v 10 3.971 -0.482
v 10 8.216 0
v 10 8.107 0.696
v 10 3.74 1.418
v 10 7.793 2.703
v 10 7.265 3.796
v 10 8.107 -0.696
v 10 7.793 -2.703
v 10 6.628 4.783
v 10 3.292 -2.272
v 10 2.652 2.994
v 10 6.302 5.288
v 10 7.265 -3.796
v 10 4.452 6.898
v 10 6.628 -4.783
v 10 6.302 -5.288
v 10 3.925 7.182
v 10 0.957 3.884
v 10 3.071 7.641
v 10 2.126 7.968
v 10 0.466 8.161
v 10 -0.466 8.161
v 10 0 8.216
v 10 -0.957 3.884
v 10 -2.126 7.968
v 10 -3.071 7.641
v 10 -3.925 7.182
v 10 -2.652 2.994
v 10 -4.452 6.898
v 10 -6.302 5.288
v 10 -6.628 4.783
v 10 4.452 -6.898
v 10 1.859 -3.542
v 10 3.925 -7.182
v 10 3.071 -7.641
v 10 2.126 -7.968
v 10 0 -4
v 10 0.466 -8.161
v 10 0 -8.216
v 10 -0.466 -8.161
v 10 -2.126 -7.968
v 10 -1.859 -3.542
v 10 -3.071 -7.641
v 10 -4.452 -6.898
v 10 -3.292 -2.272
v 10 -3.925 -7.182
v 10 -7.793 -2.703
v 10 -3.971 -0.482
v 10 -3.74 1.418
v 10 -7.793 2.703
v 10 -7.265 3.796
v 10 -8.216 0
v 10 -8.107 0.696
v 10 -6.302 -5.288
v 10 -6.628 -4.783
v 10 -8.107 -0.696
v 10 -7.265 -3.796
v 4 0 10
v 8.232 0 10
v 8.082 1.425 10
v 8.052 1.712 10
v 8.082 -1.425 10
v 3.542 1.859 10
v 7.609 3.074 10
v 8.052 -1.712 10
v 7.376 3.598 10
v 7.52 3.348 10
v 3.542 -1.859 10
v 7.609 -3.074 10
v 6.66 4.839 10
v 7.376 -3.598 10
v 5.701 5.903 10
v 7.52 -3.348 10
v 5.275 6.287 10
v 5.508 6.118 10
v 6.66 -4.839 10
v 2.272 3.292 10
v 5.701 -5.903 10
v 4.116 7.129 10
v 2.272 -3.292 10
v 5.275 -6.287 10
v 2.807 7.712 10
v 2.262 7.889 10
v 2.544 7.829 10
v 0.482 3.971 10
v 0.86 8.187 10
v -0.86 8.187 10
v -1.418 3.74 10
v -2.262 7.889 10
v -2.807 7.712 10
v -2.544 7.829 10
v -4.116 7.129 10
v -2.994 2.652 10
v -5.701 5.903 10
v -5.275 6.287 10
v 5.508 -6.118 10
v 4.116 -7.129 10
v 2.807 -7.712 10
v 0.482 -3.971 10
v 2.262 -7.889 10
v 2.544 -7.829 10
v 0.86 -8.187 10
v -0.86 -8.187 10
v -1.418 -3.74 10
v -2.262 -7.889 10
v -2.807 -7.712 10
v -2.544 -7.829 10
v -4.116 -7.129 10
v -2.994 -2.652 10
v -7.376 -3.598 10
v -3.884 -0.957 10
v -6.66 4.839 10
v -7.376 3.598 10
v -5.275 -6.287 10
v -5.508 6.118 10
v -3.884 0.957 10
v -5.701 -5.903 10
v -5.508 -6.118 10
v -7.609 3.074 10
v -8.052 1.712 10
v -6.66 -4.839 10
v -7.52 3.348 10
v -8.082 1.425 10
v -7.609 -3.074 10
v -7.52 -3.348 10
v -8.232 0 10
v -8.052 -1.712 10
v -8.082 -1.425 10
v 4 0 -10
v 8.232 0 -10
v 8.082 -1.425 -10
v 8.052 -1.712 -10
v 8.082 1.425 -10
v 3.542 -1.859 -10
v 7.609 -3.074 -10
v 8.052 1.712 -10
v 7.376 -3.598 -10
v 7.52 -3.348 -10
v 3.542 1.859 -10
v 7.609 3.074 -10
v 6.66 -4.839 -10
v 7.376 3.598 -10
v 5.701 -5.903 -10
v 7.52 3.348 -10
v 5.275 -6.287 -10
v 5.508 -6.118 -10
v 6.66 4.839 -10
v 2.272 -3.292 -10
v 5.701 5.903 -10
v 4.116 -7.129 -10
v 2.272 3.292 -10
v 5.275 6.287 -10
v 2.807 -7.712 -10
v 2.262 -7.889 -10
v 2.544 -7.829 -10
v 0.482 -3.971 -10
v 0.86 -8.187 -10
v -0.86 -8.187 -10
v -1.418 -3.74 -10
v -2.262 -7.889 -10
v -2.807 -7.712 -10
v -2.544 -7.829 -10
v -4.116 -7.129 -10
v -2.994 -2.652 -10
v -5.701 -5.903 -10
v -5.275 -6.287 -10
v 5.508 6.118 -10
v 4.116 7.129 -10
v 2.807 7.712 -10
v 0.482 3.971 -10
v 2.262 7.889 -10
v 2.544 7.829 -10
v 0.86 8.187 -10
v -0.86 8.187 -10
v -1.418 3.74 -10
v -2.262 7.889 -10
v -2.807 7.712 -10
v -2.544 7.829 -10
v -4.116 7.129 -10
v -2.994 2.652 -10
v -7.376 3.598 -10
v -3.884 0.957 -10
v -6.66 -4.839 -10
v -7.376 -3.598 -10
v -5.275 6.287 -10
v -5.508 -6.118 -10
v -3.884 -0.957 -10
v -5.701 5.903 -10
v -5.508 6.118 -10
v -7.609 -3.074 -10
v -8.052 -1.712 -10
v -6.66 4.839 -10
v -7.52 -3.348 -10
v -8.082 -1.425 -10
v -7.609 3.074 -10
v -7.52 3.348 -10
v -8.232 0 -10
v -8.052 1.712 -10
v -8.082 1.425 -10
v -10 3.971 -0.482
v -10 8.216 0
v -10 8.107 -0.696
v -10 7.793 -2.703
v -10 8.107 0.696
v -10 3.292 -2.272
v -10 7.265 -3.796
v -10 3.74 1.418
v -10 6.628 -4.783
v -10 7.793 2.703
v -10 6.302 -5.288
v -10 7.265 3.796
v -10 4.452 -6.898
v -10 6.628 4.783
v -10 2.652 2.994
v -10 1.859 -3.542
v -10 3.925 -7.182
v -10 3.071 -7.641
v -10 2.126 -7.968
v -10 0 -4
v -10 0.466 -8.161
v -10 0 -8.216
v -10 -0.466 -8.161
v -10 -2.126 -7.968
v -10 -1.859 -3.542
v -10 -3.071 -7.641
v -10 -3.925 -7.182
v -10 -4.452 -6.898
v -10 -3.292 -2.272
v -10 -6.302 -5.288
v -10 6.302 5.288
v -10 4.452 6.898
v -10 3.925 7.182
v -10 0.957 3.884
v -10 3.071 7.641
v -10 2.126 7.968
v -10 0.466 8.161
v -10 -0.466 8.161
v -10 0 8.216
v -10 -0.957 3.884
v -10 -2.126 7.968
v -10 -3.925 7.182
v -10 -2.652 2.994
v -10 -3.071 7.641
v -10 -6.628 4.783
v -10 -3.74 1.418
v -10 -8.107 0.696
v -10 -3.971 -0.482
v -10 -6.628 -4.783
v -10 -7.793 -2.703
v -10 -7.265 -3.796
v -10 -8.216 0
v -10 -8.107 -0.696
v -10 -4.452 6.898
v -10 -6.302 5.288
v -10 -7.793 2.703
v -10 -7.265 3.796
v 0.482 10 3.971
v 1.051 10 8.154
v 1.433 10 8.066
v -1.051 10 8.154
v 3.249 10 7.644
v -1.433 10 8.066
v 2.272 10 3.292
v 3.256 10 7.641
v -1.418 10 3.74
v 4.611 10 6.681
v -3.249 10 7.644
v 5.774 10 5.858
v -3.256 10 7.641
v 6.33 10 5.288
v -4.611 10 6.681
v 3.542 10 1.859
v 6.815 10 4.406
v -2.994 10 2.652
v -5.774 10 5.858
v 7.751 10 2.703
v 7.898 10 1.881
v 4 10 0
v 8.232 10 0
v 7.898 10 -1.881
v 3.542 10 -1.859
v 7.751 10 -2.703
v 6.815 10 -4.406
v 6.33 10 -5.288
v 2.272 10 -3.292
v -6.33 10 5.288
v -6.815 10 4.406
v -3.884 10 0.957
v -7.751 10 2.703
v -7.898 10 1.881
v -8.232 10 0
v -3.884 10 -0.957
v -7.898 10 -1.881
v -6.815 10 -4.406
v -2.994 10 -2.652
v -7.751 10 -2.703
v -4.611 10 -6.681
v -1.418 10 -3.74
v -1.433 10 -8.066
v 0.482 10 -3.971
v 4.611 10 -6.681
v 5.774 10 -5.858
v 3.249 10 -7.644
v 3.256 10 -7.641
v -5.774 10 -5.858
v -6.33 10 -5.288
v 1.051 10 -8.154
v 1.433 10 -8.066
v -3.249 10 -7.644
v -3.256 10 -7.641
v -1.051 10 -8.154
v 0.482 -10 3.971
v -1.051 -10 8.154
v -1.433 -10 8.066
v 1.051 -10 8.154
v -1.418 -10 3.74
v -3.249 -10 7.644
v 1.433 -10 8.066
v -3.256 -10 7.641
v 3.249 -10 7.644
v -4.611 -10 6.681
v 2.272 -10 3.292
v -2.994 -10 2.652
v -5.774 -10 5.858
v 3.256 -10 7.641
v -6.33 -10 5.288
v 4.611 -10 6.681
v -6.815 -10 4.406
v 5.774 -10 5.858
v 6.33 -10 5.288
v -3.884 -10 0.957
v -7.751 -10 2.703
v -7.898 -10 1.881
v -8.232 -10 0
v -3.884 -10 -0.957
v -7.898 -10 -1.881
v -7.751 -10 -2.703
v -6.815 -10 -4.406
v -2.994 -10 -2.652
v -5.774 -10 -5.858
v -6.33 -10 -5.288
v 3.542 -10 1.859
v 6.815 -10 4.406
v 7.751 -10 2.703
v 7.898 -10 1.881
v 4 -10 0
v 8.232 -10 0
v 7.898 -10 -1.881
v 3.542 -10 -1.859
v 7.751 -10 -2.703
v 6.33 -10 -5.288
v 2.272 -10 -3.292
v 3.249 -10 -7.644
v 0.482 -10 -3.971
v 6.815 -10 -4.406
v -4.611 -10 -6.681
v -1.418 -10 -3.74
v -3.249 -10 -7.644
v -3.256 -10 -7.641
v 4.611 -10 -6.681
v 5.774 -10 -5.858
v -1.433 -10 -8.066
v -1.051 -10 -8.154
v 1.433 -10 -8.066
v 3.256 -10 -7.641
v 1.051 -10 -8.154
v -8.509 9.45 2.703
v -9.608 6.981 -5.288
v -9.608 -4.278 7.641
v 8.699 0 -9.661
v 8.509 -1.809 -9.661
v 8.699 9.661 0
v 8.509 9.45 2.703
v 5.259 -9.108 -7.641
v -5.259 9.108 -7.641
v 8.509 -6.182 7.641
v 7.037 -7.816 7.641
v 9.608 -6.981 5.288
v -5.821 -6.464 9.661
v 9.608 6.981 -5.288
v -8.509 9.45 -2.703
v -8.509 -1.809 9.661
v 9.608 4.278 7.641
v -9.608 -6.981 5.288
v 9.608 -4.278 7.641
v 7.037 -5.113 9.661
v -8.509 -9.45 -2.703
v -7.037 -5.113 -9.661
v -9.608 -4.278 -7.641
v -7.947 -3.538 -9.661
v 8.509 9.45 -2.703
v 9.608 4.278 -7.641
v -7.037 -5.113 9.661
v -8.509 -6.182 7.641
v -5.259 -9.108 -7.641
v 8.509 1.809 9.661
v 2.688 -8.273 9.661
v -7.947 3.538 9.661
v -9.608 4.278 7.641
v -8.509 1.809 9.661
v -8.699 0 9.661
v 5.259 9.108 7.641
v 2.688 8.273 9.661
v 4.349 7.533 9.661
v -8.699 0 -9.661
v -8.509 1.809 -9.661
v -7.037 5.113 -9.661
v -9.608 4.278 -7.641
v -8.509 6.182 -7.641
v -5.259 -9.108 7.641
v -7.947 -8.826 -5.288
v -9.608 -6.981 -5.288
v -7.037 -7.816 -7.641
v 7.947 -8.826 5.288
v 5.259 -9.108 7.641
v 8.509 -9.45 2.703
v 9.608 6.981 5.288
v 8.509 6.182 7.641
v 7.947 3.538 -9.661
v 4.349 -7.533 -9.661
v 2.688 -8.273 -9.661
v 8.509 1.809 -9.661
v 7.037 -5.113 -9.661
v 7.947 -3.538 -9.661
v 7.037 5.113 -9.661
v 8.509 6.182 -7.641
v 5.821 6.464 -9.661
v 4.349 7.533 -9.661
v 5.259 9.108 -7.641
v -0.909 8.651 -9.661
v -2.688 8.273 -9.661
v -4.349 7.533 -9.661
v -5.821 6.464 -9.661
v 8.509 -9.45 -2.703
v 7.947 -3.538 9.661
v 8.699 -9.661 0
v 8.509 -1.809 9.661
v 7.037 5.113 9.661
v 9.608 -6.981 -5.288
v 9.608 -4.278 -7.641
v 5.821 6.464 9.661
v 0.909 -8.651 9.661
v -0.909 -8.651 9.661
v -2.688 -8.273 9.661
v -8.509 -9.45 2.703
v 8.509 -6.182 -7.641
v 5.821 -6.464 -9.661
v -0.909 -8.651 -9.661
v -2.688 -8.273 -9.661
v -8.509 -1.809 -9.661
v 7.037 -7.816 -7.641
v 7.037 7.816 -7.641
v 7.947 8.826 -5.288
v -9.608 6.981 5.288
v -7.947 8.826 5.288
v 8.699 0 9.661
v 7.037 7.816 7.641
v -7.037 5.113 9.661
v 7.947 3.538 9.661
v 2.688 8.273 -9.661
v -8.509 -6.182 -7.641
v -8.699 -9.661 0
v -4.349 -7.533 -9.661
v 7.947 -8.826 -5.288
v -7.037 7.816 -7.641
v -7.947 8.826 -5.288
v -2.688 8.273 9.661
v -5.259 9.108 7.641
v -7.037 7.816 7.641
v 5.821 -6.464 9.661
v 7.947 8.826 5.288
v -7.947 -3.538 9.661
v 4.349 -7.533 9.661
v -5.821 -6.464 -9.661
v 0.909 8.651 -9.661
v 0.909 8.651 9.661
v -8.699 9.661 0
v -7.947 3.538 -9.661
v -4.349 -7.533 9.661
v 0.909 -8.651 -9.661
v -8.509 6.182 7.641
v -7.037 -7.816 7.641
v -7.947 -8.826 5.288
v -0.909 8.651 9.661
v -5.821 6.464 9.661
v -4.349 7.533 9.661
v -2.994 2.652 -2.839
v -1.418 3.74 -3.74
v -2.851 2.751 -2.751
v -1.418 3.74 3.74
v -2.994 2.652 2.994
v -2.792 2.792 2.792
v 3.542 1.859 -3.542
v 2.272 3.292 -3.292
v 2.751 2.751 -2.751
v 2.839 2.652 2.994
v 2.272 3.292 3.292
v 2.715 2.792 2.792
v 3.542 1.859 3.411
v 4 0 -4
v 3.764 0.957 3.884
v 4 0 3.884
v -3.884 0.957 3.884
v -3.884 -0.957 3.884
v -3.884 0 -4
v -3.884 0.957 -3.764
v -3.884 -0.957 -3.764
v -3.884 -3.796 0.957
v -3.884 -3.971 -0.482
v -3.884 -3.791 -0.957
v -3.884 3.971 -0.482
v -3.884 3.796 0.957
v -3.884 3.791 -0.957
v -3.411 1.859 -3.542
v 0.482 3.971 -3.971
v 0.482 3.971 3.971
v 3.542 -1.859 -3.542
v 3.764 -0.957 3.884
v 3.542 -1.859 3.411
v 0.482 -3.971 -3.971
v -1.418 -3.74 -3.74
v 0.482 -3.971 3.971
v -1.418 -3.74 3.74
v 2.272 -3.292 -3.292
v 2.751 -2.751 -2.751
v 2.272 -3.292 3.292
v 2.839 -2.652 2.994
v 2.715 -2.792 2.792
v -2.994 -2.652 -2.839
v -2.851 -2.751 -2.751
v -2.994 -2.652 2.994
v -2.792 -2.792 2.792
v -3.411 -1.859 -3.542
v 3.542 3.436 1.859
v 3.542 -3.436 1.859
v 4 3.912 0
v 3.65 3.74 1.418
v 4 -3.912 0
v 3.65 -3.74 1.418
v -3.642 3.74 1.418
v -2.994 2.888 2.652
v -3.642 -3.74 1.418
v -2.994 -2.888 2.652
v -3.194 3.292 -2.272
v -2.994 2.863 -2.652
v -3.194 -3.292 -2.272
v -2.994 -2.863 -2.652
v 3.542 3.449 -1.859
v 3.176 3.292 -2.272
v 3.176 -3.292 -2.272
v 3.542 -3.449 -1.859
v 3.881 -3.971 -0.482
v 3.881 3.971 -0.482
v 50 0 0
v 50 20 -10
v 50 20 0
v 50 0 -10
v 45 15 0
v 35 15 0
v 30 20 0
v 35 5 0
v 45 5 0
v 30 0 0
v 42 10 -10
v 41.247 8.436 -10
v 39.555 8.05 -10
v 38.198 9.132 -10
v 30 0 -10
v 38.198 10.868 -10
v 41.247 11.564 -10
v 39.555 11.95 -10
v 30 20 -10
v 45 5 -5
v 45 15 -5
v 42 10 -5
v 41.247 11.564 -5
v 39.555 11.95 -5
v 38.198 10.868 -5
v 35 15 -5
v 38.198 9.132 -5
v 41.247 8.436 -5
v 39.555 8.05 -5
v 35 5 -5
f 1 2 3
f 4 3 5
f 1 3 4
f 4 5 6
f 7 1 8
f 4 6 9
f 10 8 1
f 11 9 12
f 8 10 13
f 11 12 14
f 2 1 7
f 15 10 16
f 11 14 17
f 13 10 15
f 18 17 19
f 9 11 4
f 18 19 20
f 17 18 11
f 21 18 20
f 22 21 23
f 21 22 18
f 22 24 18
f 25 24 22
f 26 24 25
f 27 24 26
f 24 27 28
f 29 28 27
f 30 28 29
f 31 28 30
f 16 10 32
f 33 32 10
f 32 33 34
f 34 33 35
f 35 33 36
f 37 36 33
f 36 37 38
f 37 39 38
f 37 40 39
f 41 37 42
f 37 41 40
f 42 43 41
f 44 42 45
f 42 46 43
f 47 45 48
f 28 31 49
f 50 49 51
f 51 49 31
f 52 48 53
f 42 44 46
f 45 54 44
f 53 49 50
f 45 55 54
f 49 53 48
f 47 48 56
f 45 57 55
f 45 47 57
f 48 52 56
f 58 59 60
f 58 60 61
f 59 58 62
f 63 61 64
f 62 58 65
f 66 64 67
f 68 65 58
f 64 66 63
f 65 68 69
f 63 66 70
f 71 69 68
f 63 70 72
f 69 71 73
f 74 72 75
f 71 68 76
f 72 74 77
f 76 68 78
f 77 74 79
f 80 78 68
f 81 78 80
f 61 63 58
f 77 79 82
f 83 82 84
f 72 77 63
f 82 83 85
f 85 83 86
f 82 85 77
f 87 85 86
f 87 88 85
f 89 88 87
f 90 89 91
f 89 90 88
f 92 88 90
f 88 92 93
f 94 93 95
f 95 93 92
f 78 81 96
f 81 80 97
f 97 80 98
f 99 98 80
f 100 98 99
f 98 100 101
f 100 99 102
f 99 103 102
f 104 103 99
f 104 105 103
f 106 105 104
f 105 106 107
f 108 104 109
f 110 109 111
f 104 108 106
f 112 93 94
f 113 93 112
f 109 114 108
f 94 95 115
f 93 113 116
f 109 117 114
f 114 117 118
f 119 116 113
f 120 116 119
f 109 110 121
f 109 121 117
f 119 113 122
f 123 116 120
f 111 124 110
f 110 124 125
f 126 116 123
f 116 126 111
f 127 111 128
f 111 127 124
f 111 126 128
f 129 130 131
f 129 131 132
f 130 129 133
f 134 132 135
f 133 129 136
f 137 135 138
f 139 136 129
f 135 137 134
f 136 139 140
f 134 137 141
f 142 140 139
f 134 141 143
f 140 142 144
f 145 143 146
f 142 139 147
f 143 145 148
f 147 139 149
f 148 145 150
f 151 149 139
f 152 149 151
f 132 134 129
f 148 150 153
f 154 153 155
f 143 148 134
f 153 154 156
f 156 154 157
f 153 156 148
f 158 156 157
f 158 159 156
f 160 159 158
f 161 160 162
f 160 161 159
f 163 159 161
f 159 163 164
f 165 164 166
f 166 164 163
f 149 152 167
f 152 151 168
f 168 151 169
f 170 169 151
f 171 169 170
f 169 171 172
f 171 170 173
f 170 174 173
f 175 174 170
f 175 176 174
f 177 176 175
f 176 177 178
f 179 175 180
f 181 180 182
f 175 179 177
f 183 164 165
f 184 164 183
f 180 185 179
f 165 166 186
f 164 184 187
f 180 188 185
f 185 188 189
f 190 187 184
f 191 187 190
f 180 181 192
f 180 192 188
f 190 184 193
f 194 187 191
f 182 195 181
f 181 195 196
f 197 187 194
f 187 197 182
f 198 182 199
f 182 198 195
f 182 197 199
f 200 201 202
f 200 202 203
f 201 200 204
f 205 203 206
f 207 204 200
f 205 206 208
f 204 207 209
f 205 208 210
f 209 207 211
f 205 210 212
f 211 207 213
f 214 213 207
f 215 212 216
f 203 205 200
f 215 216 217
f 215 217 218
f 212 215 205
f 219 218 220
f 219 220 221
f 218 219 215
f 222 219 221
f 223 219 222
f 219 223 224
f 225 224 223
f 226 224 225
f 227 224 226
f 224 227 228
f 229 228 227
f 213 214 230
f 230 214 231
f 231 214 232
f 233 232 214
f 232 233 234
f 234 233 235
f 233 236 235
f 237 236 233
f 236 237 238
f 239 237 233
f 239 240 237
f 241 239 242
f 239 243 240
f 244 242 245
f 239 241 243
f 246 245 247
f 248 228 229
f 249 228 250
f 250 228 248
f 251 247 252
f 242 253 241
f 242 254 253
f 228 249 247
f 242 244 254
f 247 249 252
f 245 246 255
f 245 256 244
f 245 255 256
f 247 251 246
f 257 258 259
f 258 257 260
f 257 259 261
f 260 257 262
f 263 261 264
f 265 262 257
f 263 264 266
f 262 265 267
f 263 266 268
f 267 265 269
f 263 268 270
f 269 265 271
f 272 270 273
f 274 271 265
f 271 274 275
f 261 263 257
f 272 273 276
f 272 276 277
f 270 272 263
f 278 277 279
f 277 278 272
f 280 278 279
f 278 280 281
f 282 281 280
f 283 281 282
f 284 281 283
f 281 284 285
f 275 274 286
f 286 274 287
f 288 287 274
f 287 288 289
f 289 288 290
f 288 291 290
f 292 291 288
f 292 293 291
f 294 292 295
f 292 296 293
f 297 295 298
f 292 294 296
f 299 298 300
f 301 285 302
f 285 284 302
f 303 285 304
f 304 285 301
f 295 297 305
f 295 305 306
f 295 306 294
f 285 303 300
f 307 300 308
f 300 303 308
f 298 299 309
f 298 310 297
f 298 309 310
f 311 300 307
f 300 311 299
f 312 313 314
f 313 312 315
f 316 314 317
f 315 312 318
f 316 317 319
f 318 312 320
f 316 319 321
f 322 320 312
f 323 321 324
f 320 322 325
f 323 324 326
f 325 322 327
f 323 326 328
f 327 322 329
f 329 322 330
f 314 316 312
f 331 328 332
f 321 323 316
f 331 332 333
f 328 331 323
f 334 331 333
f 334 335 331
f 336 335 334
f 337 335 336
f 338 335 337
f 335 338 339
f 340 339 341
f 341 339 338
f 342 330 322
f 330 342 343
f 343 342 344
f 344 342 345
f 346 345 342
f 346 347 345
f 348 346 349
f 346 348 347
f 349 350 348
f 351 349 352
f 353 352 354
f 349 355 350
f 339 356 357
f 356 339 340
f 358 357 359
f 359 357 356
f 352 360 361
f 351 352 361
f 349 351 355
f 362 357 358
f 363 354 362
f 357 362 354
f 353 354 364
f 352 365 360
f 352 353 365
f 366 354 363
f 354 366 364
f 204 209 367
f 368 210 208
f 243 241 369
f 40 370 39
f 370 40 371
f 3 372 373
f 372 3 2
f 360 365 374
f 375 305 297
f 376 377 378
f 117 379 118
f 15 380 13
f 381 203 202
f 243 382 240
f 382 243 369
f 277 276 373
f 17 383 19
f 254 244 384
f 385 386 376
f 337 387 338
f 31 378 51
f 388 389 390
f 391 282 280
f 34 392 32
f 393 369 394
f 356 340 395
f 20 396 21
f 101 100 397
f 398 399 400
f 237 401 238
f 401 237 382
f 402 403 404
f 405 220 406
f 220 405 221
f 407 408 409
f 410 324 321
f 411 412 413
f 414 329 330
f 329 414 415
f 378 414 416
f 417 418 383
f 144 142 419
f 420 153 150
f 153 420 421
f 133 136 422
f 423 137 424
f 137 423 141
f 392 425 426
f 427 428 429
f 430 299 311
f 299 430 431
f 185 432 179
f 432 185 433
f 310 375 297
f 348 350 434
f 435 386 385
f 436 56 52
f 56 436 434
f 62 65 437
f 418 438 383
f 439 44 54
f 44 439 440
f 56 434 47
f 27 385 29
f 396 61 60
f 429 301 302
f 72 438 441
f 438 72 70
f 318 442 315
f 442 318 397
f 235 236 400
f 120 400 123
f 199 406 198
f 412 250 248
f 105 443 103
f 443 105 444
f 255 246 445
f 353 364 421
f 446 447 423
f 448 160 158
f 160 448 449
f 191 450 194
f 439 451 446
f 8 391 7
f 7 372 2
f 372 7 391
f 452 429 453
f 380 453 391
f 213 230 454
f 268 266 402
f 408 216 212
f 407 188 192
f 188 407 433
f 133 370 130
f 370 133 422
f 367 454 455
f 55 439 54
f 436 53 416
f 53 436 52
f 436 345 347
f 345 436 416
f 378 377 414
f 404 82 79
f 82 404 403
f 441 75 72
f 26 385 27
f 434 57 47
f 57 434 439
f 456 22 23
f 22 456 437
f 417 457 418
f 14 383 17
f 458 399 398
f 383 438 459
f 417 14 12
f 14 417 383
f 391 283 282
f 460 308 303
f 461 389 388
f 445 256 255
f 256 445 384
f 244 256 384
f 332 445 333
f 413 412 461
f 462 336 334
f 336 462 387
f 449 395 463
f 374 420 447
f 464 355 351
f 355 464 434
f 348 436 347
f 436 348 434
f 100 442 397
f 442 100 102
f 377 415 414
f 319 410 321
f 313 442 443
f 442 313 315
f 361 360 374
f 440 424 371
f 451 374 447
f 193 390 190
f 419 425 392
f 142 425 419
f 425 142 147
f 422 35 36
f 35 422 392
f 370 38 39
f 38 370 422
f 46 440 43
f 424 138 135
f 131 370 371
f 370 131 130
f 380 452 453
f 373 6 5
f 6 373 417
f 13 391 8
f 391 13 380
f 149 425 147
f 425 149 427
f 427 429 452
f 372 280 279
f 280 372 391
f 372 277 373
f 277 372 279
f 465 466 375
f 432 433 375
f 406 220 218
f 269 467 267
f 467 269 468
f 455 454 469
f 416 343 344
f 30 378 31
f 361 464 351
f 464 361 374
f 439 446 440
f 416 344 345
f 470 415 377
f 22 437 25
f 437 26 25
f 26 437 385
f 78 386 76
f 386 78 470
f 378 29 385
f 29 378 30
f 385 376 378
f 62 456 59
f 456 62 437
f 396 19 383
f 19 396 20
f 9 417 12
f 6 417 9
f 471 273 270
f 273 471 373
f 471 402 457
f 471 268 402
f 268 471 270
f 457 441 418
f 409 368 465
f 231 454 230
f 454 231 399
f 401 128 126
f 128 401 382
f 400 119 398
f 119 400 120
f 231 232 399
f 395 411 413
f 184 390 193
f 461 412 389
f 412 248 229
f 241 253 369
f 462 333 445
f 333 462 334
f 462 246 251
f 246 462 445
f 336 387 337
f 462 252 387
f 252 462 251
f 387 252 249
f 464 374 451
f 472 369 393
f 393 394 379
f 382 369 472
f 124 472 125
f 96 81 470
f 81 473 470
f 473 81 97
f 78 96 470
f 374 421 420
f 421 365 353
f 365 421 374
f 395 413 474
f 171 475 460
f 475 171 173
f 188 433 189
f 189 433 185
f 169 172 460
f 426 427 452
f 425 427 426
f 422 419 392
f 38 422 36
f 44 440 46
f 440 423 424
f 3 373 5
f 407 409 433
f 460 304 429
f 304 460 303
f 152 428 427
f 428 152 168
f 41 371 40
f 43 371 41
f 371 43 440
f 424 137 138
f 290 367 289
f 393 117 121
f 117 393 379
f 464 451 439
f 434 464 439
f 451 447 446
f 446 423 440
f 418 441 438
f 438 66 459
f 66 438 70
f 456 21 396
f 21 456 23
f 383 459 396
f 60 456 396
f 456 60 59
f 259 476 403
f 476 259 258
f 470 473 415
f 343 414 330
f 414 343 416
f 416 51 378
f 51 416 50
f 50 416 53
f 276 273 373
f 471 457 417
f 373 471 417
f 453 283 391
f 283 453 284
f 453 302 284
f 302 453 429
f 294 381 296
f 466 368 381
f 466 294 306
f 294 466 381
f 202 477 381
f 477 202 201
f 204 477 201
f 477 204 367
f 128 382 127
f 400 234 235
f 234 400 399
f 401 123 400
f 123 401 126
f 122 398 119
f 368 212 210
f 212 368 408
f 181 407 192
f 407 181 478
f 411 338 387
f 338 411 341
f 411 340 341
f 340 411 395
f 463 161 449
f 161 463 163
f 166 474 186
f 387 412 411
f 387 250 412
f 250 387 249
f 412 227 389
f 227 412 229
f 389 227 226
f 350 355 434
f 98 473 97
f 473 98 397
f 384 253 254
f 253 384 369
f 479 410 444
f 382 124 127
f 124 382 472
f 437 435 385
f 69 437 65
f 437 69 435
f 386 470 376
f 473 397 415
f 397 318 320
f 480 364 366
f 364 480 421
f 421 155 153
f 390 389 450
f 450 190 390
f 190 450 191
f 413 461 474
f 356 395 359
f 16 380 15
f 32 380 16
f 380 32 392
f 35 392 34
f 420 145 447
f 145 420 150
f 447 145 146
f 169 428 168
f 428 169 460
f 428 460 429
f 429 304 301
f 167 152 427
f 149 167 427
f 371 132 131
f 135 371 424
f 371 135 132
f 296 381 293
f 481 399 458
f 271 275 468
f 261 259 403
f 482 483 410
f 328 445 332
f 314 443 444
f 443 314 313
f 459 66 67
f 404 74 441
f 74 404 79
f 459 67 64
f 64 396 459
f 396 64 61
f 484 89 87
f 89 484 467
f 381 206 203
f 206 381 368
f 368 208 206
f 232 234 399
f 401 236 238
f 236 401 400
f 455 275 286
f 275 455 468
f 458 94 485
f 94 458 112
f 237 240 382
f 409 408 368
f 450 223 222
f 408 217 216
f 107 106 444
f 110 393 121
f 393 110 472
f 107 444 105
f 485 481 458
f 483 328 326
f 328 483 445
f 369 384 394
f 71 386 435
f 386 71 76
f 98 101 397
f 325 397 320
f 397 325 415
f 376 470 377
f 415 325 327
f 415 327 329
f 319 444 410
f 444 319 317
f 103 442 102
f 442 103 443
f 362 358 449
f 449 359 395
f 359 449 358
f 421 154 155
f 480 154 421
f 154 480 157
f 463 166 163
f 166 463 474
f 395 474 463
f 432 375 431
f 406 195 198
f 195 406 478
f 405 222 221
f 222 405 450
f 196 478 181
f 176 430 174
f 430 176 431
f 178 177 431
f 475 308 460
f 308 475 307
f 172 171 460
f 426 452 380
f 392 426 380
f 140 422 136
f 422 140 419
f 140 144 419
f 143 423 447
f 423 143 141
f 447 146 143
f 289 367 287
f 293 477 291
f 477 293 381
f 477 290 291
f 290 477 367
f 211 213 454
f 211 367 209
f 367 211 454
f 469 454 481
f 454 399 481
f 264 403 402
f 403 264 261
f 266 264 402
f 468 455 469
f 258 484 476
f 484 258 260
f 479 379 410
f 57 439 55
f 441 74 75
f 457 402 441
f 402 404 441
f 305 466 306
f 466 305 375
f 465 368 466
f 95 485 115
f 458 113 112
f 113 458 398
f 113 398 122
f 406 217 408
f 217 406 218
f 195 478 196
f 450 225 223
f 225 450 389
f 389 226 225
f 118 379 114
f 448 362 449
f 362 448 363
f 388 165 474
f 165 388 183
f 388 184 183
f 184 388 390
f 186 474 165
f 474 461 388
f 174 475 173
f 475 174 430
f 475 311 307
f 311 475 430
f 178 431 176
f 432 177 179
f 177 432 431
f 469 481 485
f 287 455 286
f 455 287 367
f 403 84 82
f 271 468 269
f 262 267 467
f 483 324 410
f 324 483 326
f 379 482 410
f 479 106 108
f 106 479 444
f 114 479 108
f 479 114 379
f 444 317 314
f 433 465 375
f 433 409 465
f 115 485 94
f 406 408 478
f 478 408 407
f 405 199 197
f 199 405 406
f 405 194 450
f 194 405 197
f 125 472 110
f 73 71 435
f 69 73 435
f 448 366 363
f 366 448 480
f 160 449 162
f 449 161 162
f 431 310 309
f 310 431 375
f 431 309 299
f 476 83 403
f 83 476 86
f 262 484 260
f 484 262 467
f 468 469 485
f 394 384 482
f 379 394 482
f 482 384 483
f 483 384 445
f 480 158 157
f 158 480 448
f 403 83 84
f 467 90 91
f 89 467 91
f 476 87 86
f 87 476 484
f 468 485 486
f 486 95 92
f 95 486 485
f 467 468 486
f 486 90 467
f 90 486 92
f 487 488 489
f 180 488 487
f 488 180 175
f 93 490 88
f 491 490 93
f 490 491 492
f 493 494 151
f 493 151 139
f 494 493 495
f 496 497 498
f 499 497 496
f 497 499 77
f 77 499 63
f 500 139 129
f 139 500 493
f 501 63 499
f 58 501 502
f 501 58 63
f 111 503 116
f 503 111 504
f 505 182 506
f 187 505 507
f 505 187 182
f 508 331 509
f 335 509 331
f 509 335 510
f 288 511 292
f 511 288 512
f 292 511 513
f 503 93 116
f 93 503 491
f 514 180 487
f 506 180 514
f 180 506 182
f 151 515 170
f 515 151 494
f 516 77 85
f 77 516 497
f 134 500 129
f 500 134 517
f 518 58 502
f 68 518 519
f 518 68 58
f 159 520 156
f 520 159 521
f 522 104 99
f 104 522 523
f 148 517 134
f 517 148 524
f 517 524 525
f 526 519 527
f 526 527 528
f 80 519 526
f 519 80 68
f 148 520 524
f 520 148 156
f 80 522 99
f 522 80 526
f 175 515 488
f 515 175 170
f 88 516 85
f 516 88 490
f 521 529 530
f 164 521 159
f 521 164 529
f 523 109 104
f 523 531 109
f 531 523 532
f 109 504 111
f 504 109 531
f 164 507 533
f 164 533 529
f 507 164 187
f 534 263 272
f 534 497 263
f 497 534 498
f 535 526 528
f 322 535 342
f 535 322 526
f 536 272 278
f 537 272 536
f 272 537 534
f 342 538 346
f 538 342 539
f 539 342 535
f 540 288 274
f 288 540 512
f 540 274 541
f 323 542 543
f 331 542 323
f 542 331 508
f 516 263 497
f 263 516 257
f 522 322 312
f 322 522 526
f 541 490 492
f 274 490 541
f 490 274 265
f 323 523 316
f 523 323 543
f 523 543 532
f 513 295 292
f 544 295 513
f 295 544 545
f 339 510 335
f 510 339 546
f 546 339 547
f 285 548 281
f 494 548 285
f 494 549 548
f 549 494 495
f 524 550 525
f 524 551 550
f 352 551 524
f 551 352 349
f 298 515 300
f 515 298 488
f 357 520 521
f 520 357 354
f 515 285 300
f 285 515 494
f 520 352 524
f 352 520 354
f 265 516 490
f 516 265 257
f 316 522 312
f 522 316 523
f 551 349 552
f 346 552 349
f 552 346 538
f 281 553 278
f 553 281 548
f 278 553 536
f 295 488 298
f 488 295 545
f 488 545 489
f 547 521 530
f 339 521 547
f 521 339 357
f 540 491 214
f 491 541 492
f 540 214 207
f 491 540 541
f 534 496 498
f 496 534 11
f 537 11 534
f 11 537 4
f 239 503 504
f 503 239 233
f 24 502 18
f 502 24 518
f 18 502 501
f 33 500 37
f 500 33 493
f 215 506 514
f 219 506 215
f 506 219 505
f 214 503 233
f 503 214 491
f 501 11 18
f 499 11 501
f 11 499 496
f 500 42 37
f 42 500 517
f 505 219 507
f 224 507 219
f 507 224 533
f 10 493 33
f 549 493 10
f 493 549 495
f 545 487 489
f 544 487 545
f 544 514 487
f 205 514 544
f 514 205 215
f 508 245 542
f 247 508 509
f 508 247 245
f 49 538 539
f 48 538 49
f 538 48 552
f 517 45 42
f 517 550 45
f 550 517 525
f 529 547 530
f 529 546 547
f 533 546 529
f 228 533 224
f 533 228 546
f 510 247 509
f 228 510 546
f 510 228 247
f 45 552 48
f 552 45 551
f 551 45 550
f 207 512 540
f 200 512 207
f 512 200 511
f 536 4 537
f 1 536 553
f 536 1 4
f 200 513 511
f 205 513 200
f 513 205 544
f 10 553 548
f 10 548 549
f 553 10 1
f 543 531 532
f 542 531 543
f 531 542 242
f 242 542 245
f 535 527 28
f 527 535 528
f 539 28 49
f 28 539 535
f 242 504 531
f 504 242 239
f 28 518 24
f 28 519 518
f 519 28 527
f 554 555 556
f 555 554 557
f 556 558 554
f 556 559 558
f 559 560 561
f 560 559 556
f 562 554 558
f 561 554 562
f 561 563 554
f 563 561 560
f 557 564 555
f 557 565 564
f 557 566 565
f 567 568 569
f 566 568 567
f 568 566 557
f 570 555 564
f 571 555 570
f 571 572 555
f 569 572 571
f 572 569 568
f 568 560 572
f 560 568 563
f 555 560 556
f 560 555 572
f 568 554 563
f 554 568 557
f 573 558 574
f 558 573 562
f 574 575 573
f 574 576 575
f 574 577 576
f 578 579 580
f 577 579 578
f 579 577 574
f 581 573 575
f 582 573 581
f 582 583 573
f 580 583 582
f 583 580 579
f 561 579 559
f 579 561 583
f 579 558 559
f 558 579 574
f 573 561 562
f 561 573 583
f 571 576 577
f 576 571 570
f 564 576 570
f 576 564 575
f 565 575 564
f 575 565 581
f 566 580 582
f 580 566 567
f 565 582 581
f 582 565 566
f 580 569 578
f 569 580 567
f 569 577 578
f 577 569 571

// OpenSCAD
// Purpose: nested booleans – cube intersected with a sphere, then a cross bore subtracted.
difference() {
    intersection() {
        cube(20, center = true);
        sphere(13);
    }
    union() {
        cylinder(h = 30, r = 4, center = true);
        rotate([90, 0, 0]) cylinder(h = 30, r = 4, center = true);
        rotate([0, 90, 0]) cylinder(h = 30, r = 4, center = true);
    }
}
translate([30, 0, -10]) difference() {
    cube([20, 20, 10]);
    translate([5, 5, 5]) cube([10, 10, 10]);
    union() {
        translate([10, 10, -1]) cylinder(h = 12, r = 2);
    }
}
